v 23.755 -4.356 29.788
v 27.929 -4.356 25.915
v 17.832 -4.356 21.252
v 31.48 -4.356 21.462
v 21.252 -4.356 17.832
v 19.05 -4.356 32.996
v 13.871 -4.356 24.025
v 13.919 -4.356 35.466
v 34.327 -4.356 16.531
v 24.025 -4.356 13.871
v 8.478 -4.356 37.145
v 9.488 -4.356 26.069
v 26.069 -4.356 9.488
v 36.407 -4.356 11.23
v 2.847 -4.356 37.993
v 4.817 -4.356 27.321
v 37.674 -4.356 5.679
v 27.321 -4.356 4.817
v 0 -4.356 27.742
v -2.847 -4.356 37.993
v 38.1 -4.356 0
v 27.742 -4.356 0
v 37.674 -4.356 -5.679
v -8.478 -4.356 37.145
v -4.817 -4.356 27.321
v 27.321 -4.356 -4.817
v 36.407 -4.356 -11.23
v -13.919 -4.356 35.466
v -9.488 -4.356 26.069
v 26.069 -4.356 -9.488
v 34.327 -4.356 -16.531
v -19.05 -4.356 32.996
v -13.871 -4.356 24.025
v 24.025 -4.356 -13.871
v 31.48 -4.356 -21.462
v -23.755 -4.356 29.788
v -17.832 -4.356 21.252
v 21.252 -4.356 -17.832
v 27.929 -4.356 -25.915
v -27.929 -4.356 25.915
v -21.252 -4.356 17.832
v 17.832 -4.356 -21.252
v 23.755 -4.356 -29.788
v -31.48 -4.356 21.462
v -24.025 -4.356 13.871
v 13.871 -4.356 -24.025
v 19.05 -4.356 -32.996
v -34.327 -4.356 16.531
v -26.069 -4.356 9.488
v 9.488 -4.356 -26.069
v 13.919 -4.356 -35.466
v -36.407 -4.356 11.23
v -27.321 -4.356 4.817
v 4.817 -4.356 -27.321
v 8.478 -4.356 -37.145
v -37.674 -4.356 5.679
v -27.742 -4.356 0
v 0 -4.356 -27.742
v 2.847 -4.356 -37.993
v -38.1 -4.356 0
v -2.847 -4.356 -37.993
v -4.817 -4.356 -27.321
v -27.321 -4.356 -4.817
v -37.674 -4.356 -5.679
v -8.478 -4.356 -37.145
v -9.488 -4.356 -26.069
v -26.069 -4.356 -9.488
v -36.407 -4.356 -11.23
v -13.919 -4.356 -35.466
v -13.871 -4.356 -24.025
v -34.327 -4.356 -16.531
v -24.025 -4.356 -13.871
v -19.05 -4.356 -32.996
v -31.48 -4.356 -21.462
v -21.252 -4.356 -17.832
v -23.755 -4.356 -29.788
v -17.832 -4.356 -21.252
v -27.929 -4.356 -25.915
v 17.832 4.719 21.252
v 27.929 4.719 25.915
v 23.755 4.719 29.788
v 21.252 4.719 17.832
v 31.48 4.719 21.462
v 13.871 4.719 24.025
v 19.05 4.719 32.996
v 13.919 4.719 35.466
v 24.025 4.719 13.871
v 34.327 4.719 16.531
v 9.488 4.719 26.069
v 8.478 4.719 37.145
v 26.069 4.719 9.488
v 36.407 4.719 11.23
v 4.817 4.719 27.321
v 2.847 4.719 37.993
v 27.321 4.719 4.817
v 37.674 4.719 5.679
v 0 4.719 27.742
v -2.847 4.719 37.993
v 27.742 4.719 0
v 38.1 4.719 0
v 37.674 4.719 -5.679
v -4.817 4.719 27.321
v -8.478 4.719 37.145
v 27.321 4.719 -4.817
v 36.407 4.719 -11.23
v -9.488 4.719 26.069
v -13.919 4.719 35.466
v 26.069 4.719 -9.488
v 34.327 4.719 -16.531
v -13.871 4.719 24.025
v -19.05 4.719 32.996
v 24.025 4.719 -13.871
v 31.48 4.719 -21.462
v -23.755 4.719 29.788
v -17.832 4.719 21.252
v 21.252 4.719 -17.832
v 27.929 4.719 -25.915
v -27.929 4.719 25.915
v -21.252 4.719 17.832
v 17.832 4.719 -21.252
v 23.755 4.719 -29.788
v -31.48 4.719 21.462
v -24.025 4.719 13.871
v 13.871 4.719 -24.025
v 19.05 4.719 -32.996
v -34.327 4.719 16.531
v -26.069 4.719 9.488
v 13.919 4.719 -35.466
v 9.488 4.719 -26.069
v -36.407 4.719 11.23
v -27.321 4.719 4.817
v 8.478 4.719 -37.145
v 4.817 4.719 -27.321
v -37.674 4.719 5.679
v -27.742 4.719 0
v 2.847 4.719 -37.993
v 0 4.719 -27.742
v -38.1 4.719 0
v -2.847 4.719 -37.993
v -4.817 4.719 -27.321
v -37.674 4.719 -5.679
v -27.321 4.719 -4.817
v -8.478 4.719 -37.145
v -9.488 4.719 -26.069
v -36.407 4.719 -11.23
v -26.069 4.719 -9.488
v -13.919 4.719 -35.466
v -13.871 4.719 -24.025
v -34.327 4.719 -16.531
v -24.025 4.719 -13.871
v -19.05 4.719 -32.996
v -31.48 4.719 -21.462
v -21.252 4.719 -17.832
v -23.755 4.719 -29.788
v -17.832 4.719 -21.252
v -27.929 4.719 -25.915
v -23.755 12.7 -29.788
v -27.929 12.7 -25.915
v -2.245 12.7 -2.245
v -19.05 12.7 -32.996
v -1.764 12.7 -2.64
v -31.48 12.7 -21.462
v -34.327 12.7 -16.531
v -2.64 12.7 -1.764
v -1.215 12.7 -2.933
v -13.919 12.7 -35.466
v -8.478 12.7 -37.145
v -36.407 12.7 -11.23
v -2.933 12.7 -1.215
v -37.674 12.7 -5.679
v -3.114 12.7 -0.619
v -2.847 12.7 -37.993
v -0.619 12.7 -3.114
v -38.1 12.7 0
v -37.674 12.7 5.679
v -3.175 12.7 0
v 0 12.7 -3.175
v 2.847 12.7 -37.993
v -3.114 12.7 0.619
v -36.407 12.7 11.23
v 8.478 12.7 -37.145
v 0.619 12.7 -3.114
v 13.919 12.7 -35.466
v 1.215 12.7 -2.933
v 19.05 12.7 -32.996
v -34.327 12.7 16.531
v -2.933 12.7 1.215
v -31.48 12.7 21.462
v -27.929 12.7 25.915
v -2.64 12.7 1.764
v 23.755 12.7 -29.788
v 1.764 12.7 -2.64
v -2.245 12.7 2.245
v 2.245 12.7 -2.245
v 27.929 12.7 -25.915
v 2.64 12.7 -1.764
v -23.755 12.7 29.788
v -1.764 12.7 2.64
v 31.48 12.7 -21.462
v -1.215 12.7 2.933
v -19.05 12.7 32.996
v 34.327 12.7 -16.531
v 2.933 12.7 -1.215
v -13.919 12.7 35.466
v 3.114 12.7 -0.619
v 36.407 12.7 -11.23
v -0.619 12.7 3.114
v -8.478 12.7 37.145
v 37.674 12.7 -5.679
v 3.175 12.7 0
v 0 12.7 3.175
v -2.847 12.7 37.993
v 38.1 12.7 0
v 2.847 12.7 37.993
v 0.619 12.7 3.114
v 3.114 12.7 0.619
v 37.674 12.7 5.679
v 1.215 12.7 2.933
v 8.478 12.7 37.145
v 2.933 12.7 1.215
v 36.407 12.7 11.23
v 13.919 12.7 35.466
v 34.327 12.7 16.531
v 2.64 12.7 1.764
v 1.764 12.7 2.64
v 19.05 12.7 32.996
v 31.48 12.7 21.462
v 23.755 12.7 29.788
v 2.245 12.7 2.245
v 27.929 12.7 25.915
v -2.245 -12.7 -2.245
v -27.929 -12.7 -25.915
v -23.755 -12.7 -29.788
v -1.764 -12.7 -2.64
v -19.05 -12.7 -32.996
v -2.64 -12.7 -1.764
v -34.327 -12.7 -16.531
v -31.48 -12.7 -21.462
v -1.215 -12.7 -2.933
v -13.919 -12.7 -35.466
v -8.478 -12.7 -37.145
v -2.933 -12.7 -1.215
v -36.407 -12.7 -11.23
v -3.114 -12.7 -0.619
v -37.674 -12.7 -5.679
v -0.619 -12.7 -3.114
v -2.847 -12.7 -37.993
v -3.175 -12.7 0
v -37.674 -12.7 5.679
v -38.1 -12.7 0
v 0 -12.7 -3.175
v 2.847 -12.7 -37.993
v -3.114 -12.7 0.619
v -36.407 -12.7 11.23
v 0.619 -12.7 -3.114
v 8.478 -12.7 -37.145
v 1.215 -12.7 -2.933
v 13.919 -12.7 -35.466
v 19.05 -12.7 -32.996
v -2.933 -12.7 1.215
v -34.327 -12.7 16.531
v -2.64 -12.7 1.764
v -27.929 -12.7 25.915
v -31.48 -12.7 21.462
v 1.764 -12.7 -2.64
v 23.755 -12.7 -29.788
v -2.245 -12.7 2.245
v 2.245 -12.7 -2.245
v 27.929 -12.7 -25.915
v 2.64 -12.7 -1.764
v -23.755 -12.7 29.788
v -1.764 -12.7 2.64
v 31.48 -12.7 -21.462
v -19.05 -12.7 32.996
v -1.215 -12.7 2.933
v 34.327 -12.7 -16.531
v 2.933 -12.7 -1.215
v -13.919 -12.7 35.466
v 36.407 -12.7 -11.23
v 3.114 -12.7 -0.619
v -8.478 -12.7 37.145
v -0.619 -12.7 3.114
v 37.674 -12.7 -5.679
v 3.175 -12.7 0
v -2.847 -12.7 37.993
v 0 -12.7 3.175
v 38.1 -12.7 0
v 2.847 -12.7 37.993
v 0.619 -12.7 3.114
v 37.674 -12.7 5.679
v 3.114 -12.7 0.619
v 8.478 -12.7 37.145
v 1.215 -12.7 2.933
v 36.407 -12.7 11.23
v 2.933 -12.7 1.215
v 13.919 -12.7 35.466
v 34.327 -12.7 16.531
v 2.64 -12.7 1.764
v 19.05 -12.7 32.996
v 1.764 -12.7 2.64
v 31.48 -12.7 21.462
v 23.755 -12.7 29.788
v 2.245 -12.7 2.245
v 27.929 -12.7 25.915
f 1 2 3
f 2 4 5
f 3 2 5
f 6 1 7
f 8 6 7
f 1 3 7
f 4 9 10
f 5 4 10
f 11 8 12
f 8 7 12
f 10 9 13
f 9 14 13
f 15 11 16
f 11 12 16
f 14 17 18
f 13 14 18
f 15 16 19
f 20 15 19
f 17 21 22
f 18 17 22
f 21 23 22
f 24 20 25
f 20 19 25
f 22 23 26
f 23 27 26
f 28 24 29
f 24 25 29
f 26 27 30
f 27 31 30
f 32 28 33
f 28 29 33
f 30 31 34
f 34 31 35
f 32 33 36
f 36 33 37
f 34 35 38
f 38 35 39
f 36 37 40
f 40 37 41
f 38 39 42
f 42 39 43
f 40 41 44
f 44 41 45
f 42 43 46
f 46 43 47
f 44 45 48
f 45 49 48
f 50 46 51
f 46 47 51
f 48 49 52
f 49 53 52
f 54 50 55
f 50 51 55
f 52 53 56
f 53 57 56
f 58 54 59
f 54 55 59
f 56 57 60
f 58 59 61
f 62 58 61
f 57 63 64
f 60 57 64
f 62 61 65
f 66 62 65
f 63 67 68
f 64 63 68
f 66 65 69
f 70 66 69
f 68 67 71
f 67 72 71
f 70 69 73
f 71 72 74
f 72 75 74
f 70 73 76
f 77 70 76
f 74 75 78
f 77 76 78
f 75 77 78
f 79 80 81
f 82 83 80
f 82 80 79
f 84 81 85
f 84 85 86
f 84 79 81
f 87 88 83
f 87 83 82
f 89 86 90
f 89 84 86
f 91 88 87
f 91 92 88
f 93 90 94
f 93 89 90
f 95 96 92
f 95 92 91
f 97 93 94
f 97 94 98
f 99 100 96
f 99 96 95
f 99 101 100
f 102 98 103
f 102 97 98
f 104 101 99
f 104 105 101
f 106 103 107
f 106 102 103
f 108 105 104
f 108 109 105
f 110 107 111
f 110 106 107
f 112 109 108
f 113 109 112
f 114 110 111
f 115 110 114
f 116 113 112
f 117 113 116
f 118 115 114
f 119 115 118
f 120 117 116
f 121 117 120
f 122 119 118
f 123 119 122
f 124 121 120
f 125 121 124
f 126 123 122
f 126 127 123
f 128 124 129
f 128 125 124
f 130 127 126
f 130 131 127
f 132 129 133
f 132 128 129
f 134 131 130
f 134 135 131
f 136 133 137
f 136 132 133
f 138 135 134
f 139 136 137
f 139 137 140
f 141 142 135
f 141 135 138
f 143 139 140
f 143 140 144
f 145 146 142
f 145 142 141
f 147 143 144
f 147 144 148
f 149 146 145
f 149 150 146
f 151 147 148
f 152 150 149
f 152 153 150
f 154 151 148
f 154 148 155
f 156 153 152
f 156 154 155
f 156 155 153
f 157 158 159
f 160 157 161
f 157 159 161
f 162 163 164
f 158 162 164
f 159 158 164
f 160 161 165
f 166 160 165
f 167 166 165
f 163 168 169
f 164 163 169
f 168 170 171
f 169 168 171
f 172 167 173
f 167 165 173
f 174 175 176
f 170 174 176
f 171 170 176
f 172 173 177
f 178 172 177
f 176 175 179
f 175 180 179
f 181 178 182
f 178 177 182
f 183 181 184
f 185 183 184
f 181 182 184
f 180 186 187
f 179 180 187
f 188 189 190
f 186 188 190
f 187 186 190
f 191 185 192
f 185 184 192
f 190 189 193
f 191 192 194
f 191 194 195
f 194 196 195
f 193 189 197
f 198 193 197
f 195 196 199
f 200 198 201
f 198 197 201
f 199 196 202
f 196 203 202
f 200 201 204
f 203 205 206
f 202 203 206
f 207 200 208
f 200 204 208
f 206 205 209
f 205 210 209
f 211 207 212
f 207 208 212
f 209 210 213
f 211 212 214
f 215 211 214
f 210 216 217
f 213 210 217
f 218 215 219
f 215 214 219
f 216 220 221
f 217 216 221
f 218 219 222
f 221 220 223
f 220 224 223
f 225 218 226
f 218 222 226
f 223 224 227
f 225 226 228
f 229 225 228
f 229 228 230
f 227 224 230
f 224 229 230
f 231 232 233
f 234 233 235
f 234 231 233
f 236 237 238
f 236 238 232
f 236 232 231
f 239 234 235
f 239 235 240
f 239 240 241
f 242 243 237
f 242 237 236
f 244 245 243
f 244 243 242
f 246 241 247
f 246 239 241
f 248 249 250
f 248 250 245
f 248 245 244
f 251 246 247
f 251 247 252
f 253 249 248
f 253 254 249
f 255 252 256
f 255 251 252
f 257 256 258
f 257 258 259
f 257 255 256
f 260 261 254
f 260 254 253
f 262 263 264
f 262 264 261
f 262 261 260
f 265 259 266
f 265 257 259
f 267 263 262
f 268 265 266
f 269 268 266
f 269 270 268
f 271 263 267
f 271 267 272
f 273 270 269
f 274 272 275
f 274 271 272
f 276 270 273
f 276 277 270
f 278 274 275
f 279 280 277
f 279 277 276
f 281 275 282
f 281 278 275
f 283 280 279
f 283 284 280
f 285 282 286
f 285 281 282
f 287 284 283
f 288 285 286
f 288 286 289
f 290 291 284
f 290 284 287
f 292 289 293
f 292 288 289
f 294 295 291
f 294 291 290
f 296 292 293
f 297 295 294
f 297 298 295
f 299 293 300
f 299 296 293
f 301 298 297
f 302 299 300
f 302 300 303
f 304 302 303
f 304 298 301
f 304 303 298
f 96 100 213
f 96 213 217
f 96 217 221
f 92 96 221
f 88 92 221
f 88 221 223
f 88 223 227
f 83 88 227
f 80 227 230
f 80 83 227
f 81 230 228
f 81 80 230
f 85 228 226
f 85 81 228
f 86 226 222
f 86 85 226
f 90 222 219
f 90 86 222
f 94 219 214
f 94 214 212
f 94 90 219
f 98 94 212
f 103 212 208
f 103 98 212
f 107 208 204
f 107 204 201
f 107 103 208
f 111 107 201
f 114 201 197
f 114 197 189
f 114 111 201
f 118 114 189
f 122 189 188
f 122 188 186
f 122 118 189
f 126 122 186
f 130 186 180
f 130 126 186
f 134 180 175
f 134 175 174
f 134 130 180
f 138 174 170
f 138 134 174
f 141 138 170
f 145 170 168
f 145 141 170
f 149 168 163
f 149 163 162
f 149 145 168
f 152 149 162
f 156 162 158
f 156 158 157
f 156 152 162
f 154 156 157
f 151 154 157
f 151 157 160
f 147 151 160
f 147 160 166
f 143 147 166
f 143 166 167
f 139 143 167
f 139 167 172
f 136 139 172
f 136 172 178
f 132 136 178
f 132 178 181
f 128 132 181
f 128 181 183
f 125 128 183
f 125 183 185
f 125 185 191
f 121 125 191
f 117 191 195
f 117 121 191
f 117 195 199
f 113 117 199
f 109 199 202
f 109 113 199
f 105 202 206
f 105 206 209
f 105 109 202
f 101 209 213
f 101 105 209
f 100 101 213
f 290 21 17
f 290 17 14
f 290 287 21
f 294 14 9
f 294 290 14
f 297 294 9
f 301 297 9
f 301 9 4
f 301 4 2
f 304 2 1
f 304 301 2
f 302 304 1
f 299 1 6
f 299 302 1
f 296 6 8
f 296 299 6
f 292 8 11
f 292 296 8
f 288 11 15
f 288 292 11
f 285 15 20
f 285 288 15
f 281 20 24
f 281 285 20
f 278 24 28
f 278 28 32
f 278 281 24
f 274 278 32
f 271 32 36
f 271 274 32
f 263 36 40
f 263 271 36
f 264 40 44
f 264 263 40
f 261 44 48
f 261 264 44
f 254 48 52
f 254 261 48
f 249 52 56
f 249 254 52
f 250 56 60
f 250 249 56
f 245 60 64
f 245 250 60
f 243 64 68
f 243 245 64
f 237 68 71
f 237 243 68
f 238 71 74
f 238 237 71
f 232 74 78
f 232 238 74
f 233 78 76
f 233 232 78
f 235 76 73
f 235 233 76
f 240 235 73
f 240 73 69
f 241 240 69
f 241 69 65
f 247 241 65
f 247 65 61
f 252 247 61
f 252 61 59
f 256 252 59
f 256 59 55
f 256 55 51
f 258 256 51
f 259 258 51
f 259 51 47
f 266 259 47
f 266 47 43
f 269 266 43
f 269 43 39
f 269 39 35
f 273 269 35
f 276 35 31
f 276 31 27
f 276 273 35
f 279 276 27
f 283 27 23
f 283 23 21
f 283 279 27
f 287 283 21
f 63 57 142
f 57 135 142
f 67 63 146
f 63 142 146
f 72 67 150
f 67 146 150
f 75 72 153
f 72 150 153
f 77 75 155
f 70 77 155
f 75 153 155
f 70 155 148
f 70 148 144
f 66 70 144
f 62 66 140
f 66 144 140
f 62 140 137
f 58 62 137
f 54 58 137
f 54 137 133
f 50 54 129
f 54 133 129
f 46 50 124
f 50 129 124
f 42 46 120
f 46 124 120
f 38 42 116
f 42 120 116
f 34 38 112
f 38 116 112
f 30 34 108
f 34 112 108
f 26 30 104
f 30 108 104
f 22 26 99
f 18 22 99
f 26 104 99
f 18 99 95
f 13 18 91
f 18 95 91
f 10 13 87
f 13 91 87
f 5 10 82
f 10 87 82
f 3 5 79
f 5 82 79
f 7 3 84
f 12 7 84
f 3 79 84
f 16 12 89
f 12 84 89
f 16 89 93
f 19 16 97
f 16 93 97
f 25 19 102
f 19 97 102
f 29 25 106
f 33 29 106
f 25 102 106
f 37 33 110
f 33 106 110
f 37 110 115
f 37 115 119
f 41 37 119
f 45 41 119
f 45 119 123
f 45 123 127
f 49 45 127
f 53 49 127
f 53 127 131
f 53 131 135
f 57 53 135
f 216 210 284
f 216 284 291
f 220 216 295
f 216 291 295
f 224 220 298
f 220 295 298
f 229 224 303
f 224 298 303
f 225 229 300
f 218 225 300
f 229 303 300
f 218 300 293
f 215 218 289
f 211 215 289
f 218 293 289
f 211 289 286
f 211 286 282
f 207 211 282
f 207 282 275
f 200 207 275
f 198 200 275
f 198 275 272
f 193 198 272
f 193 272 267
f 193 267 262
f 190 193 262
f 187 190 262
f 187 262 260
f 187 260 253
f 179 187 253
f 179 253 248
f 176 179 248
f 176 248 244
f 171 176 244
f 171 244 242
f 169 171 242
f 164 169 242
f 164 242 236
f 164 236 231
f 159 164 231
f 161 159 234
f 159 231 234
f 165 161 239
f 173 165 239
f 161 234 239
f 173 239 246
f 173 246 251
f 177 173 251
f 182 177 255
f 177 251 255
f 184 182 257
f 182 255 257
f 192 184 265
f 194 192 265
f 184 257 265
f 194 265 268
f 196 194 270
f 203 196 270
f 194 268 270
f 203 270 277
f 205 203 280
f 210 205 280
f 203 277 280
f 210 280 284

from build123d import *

# Parameters (mm, degrees)
F0_R     = 38.1
F1_DEPTH = 12.7
F2_W     = 20.0255792588
F2_H     = 9.0756523423
F4_R     = 3.175
F5_DEPTH = 25.401


with BuildPart() as f1:
    # F0 (on Front) → F1 (new body, symmetric)
    with BuildSketch(Plane.XZ):
        Circle(F0_R)
    extrude(amount=F1_DEPTH, both=True)

    # F2 (on Top) → F3 (revolve, cut)
    with BuildSketch(Plane.XY):
        with Locations((-37.7547862008, 0.1815122087)):
            Rectangle(F2_W, F2_H)
    revolve(axis=Axis((0, -0.3630269784, 0), (0, -1, 0)), mode=Mode.SUBTRACT)

    # F4 (on face) → F5 (cut, through all)
    with BuildSketch(Plane.XZ.offset(12.7)):
        Circle(F4_R)
    extrude(amount=-F5_DEPTH, mode=Mode.SUBTRACT)


solid = f1.part
